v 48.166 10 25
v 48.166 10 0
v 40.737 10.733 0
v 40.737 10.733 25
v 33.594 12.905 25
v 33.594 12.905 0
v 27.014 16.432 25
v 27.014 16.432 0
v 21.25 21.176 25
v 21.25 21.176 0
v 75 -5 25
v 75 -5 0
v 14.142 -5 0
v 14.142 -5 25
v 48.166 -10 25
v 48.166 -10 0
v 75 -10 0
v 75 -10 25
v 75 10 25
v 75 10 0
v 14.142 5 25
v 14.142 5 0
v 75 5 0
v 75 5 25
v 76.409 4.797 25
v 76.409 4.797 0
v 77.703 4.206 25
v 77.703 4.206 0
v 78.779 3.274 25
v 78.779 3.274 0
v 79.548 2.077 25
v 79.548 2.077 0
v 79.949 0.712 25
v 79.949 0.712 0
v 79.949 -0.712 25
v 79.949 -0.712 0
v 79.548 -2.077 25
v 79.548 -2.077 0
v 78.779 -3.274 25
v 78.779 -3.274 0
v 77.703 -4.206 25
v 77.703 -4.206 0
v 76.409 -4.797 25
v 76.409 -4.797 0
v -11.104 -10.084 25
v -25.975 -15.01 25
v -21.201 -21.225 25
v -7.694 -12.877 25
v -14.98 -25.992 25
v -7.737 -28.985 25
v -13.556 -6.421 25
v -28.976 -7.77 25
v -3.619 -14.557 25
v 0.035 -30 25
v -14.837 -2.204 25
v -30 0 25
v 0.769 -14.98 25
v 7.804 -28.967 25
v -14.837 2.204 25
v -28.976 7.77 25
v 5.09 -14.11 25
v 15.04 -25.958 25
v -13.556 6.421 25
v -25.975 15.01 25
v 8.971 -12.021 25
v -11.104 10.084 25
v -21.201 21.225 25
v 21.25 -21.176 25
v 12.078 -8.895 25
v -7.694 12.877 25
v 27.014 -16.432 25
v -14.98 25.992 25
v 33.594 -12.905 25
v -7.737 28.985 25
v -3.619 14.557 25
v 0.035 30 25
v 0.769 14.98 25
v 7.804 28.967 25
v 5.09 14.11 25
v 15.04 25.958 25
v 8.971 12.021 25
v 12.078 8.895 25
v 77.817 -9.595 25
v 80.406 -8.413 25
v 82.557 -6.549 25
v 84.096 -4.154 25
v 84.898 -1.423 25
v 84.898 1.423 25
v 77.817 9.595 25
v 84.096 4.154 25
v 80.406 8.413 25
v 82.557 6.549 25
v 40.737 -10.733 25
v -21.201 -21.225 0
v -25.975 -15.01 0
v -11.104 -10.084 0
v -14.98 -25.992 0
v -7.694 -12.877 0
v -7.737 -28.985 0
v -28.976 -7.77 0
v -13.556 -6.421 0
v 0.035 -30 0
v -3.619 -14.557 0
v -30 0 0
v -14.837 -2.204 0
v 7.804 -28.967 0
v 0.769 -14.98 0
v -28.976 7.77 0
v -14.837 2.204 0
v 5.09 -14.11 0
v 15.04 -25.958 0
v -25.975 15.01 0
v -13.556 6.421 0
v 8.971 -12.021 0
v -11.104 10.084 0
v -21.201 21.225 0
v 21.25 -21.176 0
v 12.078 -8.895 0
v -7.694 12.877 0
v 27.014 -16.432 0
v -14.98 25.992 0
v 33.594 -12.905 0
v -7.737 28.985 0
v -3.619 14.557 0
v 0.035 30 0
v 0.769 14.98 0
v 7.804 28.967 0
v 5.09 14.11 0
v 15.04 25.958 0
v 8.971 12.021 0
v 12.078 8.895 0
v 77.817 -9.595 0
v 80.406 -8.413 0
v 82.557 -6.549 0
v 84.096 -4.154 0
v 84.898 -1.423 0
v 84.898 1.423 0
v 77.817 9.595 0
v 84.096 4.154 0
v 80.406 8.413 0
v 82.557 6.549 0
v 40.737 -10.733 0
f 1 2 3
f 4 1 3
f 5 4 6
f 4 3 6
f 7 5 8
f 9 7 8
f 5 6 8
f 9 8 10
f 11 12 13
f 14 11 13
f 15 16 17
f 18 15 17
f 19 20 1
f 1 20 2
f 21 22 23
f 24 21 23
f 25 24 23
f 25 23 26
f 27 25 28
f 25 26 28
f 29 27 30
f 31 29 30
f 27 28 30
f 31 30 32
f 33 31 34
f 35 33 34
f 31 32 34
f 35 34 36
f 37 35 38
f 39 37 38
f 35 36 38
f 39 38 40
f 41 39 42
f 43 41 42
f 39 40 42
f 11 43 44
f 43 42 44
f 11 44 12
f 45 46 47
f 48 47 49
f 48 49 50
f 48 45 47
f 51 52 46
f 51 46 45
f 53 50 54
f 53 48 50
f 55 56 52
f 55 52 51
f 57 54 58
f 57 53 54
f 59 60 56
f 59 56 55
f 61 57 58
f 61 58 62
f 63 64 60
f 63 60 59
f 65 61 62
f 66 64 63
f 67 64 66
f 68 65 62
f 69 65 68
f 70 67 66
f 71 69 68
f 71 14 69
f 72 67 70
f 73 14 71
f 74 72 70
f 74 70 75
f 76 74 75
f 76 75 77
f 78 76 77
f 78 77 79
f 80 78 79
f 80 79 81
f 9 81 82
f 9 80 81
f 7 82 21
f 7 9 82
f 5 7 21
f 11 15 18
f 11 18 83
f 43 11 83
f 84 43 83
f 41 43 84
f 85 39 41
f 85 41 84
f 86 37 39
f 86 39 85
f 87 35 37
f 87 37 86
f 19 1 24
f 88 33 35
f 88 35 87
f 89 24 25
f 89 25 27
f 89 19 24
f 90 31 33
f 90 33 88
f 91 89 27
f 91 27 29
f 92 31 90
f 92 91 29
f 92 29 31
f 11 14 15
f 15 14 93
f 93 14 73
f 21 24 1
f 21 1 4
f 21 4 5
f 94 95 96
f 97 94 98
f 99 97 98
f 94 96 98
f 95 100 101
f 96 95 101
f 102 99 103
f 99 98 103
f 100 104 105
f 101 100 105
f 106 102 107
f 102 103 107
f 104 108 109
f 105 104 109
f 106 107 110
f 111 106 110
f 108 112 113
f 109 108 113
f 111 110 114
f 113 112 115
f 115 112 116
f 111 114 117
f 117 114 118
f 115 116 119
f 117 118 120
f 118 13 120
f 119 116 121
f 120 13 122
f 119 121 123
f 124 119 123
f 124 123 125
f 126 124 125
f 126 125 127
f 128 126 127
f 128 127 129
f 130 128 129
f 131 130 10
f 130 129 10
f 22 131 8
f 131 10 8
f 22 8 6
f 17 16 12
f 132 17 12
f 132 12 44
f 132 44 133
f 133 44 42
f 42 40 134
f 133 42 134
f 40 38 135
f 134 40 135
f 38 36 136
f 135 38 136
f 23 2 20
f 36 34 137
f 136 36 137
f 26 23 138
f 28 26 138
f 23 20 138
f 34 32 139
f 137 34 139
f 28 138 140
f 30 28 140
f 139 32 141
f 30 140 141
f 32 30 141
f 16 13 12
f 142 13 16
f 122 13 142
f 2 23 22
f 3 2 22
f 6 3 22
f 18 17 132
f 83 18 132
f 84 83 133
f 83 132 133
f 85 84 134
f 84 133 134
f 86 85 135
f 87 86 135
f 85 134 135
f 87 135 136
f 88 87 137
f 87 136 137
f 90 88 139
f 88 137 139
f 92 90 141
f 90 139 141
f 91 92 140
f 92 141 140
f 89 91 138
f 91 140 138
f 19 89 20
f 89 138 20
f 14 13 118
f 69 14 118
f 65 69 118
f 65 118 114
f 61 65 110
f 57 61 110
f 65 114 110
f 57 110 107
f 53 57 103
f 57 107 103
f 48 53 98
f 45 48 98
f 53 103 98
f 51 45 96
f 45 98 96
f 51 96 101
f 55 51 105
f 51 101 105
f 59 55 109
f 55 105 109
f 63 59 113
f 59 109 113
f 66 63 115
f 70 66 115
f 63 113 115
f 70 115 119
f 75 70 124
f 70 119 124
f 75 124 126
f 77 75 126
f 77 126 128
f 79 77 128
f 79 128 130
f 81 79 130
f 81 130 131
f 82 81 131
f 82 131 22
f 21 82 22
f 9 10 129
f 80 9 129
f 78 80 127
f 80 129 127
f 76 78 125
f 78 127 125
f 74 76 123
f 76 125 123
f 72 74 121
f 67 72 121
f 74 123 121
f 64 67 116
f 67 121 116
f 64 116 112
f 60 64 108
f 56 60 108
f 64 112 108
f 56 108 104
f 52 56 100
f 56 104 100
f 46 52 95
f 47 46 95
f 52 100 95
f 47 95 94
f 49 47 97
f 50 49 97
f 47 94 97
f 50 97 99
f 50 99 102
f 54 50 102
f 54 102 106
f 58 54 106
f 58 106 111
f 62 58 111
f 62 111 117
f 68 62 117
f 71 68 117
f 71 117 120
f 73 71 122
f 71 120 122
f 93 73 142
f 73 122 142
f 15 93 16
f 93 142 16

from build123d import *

# Parameters (mm, degrees)
F1_DEPTH = 25


# Not quite as in the source:
# - ends of sketch curves that miss each other by under 0.0002 mm in the source are joined


with BuildPart() as f1:
    # F0 (on Top) → F1 (new body)
    with BuildSketch(Plane.XY):
        with BuildLine():
            ThreePointArc((48.1663785379, 9.9999997765), (33.5940436684, 12.9051702933), (21.2498728844, 21.1764704896))
            ThreePointArc((21.2498728844, 21.1764704896), (-30, 6.96e-08), (21.2498727861, -21.1764705882))
            ThreePointArc((21.2498727861, -21.1764705882), (33.5940435271, -12.9051704831), (48.1663783152, -10))
            Line((48.1663783152, -10), (75, -10))
            ThreePointArc((75, -10), (84.9999997765, 0), (75, 9.9999997765))
            Line((75, 9.9999997765), (48.1663785379, 9.9999997765))
        make_face()
        with BuildLine():
            ThreePointArc((14.1421356237, -5), (-15, 0), (14.1421356237, 5))
            Line((14.1421356237, 5), (75, 5))
            ThreePointArc((75, 5), (80, 0), (75, -5))
            Line((75, -5), (14.1421356237, -5))
        make_face(mode=Mode.SUBTRACT)
    extrude(amount=F1_DEPTH)


solid = f1.part
